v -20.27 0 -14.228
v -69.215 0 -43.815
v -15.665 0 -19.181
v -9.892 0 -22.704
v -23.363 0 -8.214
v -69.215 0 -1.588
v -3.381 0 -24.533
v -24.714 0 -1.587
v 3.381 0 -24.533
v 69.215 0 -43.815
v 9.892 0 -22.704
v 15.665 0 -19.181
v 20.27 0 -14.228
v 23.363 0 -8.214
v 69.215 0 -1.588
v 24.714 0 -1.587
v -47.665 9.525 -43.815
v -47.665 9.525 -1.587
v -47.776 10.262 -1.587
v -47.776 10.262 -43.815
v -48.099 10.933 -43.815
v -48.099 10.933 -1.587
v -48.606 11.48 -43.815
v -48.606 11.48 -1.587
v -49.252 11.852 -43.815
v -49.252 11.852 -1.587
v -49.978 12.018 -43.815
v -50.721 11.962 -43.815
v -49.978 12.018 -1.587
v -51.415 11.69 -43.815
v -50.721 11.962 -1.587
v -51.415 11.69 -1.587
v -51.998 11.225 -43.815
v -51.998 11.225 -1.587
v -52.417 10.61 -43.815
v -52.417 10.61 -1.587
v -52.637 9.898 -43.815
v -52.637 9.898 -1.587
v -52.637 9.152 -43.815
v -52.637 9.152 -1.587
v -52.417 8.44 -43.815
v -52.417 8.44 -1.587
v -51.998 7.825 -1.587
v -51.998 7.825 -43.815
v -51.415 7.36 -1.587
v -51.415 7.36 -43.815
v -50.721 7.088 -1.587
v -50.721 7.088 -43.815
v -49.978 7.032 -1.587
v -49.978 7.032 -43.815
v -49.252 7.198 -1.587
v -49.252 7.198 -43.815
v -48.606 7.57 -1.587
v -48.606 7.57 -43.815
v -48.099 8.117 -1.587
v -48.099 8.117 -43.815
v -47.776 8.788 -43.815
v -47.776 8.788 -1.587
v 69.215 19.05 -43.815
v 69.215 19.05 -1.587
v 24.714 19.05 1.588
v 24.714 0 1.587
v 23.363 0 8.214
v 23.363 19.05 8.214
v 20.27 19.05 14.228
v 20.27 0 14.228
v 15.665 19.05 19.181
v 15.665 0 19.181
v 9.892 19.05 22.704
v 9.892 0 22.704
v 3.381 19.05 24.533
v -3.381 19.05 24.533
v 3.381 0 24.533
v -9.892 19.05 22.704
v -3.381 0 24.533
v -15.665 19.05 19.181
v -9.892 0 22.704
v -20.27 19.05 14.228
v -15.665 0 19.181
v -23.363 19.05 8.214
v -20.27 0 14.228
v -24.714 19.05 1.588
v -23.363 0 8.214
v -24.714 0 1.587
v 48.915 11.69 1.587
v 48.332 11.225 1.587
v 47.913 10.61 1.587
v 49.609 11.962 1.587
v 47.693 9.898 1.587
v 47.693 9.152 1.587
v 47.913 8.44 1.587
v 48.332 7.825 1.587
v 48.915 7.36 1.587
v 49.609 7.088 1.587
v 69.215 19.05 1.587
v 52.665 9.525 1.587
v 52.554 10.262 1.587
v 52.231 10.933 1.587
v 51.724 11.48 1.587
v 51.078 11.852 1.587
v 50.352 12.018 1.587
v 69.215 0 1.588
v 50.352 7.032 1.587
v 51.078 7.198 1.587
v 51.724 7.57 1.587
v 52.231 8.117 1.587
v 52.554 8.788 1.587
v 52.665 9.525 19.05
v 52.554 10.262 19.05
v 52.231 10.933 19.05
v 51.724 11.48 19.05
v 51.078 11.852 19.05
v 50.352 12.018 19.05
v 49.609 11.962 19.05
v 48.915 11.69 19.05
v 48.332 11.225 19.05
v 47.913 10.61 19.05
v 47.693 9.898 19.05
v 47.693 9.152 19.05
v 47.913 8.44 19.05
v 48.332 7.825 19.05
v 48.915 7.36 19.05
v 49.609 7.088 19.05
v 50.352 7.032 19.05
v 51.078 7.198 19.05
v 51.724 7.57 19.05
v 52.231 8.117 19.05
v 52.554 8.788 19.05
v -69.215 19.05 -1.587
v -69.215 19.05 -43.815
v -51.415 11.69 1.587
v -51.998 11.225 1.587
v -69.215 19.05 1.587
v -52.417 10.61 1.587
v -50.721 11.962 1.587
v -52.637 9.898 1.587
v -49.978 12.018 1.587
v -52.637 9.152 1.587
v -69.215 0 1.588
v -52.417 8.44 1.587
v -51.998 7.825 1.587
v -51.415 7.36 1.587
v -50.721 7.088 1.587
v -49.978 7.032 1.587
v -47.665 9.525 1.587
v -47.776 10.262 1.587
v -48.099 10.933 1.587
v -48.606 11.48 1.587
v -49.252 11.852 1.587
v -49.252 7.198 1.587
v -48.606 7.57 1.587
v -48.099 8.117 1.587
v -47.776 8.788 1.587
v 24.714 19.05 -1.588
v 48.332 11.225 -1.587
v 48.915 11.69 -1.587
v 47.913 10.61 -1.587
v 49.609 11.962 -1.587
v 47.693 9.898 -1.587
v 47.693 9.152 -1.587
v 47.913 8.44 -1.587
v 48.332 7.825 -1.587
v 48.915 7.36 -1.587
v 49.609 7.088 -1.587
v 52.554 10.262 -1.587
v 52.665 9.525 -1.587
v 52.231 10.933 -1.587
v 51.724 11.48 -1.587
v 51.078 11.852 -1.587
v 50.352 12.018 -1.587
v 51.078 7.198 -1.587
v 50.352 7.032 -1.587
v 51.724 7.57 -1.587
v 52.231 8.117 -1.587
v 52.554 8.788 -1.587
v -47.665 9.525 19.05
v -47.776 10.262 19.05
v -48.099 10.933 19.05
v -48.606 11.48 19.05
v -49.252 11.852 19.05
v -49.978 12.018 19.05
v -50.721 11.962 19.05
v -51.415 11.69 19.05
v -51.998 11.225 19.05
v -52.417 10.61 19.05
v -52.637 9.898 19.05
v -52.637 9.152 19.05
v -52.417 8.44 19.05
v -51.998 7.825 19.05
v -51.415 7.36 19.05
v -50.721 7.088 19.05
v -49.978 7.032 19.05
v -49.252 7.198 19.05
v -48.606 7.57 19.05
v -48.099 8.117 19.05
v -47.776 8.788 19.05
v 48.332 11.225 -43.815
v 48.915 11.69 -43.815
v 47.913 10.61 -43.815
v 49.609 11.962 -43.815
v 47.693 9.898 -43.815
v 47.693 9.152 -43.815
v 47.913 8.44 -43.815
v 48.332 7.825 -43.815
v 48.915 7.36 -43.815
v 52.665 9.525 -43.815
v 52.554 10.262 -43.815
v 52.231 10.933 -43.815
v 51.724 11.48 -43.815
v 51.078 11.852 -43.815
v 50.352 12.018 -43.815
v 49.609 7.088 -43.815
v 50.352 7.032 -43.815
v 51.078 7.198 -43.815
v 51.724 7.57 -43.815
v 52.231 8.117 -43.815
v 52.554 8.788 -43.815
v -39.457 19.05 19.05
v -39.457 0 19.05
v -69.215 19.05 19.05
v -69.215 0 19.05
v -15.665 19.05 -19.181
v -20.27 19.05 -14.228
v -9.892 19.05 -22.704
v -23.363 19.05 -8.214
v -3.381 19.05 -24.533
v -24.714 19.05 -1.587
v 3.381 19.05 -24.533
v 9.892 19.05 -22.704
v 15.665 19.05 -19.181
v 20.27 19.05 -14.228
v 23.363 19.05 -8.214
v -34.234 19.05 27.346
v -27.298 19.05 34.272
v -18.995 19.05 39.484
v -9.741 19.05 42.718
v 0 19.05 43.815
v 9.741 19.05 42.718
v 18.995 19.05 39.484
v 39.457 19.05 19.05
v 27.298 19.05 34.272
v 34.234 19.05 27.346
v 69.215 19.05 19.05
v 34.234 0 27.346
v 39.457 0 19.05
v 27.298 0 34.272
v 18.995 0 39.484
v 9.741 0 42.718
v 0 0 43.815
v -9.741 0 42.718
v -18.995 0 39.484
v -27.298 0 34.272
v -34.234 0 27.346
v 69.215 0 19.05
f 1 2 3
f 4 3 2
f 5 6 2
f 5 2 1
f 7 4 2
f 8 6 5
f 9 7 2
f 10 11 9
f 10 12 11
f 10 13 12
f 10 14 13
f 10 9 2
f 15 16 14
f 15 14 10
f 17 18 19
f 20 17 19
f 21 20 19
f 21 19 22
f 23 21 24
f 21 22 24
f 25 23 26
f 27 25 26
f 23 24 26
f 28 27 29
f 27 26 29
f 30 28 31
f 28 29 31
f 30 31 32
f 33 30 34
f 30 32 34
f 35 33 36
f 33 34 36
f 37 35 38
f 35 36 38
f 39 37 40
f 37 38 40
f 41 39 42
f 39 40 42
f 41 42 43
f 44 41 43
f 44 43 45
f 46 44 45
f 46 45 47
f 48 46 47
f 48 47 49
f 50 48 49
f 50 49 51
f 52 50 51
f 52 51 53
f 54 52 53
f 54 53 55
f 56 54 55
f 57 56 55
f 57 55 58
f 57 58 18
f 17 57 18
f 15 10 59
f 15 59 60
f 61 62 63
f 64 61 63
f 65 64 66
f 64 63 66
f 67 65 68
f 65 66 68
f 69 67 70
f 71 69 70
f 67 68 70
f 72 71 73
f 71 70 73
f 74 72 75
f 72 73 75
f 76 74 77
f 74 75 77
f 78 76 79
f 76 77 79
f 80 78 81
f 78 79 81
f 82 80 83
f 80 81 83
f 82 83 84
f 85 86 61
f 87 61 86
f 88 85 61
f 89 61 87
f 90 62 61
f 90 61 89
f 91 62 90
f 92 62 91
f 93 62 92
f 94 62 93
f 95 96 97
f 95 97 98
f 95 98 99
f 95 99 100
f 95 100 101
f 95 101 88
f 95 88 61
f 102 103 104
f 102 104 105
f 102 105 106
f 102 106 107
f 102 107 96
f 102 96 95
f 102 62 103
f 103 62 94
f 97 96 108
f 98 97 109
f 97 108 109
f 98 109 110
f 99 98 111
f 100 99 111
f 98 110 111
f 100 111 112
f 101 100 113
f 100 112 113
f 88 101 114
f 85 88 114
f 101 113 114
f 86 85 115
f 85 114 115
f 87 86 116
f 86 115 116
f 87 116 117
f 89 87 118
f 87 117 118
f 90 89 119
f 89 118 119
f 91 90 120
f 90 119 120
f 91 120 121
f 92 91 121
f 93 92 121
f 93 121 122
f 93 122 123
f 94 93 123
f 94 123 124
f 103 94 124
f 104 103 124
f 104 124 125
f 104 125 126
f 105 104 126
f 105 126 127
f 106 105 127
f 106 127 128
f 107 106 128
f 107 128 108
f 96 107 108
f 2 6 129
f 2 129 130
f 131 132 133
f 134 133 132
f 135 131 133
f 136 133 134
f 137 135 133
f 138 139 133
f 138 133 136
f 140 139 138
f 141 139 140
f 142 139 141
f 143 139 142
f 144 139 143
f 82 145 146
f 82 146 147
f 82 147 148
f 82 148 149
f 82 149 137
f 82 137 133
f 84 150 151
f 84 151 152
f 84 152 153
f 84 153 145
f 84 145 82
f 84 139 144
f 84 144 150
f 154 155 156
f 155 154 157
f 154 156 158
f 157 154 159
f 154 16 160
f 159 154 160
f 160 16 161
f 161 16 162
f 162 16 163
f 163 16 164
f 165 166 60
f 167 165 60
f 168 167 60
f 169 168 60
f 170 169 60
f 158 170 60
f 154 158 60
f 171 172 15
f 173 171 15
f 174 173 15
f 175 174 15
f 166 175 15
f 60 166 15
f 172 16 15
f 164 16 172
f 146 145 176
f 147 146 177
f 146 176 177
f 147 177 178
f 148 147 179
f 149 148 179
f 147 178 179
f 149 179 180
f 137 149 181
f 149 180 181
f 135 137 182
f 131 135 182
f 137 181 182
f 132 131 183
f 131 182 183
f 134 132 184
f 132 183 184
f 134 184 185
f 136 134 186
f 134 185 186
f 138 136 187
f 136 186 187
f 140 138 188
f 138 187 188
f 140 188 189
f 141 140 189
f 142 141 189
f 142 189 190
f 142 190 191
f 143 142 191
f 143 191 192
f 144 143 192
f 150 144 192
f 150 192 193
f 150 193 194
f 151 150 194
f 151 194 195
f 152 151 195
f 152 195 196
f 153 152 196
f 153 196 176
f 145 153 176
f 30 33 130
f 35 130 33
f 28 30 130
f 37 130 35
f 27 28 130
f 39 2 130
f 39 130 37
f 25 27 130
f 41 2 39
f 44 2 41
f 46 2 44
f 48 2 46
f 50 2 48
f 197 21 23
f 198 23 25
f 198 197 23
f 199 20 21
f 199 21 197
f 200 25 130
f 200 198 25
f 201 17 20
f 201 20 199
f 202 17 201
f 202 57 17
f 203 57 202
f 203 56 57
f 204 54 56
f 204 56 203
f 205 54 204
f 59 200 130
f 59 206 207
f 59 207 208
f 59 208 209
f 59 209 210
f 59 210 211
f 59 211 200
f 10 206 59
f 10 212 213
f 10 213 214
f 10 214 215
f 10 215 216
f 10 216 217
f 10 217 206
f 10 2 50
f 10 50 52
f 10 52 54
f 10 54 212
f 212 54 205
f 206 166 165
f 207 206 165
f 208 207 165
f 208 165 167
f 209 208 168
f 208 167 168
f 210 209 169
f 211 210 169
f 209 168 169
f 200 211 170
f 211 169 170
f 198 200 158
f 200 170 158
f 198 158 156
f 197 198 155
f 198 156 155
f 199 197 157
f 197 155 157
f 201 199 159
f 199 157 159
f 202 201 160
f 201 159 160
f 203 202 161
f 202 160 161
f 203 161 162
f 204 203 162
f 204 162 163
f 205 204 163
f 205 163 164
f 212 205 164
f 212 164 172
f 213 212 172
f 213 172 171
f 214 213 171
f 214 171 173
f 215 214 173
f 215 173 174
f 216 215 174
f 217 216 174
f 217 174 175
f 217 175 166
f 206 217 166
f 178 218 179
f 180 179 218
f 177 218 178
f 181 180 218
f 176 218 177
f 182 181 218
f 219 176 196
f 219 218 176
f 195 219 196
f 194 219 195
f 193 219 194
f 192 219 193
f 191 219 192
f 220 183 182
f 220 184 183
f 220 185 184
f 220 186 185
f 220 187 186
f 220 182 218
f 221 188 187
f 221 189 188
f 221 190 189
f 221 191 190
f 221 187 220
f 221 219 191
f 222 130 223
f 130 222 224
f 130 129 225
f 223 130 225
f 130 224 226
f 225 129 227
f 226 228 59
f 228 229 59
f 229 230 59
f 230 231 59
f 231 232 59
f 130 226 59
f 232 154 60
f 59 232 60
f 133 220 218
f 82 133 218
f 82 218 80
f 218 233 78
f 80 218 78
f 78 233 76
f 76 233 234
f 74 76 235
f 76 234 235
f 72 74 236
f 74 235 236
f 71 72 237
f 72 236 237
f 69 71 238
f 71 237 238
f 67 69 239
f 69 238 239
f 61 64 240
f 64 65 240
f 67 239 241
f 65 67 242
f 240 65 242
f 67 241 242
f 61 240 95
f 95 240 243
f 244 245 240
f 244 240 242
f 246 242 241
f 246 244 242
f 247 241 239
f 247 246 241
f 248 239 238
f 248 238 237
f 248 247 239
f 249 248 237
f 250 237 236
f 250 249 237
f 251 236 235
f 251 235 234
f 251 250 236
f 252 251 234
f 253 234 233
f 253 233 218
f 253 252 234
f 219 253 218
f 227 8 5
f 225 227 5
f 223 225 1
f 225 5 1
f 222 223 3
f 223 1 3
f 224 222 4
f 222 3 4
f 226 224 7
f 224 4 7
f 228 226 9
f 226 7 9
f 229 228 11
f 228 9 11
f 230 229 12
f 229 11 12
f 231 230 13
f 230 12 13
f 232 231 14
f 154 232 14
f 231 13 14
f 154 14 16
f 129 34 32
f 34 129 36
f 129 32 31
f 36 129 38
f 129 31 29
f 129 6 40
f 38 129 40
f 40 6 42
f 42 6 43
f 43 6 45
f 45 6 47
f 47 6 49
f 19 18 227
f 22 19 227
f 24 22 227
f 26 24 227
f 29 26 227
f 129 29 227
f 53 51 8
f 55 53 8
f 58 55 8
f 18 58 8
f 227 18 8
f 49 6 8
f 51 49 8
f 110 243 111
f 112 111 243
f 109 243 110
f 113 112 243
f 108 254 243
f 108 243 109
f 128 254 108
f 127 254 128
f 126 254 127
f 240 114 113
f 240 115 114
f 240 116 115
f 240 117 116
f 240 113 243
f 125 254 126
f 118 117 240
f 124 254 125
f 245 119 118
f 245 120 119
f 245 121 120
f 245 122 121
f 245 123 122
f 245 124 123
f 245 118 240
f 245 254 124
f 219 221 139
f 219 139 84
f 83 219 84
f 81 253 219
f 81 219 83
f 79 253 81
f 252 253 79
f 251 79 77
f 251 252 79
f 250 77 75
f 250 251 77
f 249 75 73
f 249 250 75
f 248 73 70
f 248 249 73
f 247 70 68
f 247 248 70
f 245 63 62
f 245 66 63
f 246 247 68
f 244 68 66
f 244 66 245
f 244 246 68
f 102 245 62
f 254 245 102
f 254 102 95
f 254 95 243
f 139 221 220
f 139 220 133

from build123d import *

# Parameters (mm, degrees)
F0_R     = 24.765
F1_DEPTH = 19.05
F2_W     = 138.43
F2_H     = 3.175
F3_DEPTH = 25.4
F4_R     = 2.5
F5_DEPTH = 127


with BuildPart() as f1:
    # F0 (on Front) → F1 (new body)
    with BuildSketch(Plane.XZ):
        with BuildLine():
            Line((69.215, 19.05), (39.45696, 19.05))
            ThreePointArc((39.45696, 19.05), (0, 43.815), (-39.45696, 19.05))
            Line((-39.45696, 19.05), (-69.215, 19.05))
            Line((-69.215, 19.05), (-69.215, -43.815))
            Line((-69.215, -43.815), (69.215, -43.815))
            Line((69.215, -43.815), (69.215, 19.05))
        make_face()
        Circle(F0_R, mode=Mode.SUBTRACT)
    extrude(amount=-F1_DEPTH)

    # F2 (on face) → F3 (cut)
    with BuildSketch(Plane.XZ):
        Rectangle(F2_W, F2_H)
    extrude(amount=-F3_DEPTH, mode=Mode.SUBTRACT)

    # F4 (on face) → F5 (cut)
    with BuildSketch(Plane.XY.offset(19.05)):
        with Locations((-50.165, 9.525)):
            Circle(F4_R)
        with Locations((50.165, 9.525)):
            Circle(F4_R)
    extrude(amount=-F5_DEPTH, mode=Mode.SUBTRACT)


solid = f1.part
